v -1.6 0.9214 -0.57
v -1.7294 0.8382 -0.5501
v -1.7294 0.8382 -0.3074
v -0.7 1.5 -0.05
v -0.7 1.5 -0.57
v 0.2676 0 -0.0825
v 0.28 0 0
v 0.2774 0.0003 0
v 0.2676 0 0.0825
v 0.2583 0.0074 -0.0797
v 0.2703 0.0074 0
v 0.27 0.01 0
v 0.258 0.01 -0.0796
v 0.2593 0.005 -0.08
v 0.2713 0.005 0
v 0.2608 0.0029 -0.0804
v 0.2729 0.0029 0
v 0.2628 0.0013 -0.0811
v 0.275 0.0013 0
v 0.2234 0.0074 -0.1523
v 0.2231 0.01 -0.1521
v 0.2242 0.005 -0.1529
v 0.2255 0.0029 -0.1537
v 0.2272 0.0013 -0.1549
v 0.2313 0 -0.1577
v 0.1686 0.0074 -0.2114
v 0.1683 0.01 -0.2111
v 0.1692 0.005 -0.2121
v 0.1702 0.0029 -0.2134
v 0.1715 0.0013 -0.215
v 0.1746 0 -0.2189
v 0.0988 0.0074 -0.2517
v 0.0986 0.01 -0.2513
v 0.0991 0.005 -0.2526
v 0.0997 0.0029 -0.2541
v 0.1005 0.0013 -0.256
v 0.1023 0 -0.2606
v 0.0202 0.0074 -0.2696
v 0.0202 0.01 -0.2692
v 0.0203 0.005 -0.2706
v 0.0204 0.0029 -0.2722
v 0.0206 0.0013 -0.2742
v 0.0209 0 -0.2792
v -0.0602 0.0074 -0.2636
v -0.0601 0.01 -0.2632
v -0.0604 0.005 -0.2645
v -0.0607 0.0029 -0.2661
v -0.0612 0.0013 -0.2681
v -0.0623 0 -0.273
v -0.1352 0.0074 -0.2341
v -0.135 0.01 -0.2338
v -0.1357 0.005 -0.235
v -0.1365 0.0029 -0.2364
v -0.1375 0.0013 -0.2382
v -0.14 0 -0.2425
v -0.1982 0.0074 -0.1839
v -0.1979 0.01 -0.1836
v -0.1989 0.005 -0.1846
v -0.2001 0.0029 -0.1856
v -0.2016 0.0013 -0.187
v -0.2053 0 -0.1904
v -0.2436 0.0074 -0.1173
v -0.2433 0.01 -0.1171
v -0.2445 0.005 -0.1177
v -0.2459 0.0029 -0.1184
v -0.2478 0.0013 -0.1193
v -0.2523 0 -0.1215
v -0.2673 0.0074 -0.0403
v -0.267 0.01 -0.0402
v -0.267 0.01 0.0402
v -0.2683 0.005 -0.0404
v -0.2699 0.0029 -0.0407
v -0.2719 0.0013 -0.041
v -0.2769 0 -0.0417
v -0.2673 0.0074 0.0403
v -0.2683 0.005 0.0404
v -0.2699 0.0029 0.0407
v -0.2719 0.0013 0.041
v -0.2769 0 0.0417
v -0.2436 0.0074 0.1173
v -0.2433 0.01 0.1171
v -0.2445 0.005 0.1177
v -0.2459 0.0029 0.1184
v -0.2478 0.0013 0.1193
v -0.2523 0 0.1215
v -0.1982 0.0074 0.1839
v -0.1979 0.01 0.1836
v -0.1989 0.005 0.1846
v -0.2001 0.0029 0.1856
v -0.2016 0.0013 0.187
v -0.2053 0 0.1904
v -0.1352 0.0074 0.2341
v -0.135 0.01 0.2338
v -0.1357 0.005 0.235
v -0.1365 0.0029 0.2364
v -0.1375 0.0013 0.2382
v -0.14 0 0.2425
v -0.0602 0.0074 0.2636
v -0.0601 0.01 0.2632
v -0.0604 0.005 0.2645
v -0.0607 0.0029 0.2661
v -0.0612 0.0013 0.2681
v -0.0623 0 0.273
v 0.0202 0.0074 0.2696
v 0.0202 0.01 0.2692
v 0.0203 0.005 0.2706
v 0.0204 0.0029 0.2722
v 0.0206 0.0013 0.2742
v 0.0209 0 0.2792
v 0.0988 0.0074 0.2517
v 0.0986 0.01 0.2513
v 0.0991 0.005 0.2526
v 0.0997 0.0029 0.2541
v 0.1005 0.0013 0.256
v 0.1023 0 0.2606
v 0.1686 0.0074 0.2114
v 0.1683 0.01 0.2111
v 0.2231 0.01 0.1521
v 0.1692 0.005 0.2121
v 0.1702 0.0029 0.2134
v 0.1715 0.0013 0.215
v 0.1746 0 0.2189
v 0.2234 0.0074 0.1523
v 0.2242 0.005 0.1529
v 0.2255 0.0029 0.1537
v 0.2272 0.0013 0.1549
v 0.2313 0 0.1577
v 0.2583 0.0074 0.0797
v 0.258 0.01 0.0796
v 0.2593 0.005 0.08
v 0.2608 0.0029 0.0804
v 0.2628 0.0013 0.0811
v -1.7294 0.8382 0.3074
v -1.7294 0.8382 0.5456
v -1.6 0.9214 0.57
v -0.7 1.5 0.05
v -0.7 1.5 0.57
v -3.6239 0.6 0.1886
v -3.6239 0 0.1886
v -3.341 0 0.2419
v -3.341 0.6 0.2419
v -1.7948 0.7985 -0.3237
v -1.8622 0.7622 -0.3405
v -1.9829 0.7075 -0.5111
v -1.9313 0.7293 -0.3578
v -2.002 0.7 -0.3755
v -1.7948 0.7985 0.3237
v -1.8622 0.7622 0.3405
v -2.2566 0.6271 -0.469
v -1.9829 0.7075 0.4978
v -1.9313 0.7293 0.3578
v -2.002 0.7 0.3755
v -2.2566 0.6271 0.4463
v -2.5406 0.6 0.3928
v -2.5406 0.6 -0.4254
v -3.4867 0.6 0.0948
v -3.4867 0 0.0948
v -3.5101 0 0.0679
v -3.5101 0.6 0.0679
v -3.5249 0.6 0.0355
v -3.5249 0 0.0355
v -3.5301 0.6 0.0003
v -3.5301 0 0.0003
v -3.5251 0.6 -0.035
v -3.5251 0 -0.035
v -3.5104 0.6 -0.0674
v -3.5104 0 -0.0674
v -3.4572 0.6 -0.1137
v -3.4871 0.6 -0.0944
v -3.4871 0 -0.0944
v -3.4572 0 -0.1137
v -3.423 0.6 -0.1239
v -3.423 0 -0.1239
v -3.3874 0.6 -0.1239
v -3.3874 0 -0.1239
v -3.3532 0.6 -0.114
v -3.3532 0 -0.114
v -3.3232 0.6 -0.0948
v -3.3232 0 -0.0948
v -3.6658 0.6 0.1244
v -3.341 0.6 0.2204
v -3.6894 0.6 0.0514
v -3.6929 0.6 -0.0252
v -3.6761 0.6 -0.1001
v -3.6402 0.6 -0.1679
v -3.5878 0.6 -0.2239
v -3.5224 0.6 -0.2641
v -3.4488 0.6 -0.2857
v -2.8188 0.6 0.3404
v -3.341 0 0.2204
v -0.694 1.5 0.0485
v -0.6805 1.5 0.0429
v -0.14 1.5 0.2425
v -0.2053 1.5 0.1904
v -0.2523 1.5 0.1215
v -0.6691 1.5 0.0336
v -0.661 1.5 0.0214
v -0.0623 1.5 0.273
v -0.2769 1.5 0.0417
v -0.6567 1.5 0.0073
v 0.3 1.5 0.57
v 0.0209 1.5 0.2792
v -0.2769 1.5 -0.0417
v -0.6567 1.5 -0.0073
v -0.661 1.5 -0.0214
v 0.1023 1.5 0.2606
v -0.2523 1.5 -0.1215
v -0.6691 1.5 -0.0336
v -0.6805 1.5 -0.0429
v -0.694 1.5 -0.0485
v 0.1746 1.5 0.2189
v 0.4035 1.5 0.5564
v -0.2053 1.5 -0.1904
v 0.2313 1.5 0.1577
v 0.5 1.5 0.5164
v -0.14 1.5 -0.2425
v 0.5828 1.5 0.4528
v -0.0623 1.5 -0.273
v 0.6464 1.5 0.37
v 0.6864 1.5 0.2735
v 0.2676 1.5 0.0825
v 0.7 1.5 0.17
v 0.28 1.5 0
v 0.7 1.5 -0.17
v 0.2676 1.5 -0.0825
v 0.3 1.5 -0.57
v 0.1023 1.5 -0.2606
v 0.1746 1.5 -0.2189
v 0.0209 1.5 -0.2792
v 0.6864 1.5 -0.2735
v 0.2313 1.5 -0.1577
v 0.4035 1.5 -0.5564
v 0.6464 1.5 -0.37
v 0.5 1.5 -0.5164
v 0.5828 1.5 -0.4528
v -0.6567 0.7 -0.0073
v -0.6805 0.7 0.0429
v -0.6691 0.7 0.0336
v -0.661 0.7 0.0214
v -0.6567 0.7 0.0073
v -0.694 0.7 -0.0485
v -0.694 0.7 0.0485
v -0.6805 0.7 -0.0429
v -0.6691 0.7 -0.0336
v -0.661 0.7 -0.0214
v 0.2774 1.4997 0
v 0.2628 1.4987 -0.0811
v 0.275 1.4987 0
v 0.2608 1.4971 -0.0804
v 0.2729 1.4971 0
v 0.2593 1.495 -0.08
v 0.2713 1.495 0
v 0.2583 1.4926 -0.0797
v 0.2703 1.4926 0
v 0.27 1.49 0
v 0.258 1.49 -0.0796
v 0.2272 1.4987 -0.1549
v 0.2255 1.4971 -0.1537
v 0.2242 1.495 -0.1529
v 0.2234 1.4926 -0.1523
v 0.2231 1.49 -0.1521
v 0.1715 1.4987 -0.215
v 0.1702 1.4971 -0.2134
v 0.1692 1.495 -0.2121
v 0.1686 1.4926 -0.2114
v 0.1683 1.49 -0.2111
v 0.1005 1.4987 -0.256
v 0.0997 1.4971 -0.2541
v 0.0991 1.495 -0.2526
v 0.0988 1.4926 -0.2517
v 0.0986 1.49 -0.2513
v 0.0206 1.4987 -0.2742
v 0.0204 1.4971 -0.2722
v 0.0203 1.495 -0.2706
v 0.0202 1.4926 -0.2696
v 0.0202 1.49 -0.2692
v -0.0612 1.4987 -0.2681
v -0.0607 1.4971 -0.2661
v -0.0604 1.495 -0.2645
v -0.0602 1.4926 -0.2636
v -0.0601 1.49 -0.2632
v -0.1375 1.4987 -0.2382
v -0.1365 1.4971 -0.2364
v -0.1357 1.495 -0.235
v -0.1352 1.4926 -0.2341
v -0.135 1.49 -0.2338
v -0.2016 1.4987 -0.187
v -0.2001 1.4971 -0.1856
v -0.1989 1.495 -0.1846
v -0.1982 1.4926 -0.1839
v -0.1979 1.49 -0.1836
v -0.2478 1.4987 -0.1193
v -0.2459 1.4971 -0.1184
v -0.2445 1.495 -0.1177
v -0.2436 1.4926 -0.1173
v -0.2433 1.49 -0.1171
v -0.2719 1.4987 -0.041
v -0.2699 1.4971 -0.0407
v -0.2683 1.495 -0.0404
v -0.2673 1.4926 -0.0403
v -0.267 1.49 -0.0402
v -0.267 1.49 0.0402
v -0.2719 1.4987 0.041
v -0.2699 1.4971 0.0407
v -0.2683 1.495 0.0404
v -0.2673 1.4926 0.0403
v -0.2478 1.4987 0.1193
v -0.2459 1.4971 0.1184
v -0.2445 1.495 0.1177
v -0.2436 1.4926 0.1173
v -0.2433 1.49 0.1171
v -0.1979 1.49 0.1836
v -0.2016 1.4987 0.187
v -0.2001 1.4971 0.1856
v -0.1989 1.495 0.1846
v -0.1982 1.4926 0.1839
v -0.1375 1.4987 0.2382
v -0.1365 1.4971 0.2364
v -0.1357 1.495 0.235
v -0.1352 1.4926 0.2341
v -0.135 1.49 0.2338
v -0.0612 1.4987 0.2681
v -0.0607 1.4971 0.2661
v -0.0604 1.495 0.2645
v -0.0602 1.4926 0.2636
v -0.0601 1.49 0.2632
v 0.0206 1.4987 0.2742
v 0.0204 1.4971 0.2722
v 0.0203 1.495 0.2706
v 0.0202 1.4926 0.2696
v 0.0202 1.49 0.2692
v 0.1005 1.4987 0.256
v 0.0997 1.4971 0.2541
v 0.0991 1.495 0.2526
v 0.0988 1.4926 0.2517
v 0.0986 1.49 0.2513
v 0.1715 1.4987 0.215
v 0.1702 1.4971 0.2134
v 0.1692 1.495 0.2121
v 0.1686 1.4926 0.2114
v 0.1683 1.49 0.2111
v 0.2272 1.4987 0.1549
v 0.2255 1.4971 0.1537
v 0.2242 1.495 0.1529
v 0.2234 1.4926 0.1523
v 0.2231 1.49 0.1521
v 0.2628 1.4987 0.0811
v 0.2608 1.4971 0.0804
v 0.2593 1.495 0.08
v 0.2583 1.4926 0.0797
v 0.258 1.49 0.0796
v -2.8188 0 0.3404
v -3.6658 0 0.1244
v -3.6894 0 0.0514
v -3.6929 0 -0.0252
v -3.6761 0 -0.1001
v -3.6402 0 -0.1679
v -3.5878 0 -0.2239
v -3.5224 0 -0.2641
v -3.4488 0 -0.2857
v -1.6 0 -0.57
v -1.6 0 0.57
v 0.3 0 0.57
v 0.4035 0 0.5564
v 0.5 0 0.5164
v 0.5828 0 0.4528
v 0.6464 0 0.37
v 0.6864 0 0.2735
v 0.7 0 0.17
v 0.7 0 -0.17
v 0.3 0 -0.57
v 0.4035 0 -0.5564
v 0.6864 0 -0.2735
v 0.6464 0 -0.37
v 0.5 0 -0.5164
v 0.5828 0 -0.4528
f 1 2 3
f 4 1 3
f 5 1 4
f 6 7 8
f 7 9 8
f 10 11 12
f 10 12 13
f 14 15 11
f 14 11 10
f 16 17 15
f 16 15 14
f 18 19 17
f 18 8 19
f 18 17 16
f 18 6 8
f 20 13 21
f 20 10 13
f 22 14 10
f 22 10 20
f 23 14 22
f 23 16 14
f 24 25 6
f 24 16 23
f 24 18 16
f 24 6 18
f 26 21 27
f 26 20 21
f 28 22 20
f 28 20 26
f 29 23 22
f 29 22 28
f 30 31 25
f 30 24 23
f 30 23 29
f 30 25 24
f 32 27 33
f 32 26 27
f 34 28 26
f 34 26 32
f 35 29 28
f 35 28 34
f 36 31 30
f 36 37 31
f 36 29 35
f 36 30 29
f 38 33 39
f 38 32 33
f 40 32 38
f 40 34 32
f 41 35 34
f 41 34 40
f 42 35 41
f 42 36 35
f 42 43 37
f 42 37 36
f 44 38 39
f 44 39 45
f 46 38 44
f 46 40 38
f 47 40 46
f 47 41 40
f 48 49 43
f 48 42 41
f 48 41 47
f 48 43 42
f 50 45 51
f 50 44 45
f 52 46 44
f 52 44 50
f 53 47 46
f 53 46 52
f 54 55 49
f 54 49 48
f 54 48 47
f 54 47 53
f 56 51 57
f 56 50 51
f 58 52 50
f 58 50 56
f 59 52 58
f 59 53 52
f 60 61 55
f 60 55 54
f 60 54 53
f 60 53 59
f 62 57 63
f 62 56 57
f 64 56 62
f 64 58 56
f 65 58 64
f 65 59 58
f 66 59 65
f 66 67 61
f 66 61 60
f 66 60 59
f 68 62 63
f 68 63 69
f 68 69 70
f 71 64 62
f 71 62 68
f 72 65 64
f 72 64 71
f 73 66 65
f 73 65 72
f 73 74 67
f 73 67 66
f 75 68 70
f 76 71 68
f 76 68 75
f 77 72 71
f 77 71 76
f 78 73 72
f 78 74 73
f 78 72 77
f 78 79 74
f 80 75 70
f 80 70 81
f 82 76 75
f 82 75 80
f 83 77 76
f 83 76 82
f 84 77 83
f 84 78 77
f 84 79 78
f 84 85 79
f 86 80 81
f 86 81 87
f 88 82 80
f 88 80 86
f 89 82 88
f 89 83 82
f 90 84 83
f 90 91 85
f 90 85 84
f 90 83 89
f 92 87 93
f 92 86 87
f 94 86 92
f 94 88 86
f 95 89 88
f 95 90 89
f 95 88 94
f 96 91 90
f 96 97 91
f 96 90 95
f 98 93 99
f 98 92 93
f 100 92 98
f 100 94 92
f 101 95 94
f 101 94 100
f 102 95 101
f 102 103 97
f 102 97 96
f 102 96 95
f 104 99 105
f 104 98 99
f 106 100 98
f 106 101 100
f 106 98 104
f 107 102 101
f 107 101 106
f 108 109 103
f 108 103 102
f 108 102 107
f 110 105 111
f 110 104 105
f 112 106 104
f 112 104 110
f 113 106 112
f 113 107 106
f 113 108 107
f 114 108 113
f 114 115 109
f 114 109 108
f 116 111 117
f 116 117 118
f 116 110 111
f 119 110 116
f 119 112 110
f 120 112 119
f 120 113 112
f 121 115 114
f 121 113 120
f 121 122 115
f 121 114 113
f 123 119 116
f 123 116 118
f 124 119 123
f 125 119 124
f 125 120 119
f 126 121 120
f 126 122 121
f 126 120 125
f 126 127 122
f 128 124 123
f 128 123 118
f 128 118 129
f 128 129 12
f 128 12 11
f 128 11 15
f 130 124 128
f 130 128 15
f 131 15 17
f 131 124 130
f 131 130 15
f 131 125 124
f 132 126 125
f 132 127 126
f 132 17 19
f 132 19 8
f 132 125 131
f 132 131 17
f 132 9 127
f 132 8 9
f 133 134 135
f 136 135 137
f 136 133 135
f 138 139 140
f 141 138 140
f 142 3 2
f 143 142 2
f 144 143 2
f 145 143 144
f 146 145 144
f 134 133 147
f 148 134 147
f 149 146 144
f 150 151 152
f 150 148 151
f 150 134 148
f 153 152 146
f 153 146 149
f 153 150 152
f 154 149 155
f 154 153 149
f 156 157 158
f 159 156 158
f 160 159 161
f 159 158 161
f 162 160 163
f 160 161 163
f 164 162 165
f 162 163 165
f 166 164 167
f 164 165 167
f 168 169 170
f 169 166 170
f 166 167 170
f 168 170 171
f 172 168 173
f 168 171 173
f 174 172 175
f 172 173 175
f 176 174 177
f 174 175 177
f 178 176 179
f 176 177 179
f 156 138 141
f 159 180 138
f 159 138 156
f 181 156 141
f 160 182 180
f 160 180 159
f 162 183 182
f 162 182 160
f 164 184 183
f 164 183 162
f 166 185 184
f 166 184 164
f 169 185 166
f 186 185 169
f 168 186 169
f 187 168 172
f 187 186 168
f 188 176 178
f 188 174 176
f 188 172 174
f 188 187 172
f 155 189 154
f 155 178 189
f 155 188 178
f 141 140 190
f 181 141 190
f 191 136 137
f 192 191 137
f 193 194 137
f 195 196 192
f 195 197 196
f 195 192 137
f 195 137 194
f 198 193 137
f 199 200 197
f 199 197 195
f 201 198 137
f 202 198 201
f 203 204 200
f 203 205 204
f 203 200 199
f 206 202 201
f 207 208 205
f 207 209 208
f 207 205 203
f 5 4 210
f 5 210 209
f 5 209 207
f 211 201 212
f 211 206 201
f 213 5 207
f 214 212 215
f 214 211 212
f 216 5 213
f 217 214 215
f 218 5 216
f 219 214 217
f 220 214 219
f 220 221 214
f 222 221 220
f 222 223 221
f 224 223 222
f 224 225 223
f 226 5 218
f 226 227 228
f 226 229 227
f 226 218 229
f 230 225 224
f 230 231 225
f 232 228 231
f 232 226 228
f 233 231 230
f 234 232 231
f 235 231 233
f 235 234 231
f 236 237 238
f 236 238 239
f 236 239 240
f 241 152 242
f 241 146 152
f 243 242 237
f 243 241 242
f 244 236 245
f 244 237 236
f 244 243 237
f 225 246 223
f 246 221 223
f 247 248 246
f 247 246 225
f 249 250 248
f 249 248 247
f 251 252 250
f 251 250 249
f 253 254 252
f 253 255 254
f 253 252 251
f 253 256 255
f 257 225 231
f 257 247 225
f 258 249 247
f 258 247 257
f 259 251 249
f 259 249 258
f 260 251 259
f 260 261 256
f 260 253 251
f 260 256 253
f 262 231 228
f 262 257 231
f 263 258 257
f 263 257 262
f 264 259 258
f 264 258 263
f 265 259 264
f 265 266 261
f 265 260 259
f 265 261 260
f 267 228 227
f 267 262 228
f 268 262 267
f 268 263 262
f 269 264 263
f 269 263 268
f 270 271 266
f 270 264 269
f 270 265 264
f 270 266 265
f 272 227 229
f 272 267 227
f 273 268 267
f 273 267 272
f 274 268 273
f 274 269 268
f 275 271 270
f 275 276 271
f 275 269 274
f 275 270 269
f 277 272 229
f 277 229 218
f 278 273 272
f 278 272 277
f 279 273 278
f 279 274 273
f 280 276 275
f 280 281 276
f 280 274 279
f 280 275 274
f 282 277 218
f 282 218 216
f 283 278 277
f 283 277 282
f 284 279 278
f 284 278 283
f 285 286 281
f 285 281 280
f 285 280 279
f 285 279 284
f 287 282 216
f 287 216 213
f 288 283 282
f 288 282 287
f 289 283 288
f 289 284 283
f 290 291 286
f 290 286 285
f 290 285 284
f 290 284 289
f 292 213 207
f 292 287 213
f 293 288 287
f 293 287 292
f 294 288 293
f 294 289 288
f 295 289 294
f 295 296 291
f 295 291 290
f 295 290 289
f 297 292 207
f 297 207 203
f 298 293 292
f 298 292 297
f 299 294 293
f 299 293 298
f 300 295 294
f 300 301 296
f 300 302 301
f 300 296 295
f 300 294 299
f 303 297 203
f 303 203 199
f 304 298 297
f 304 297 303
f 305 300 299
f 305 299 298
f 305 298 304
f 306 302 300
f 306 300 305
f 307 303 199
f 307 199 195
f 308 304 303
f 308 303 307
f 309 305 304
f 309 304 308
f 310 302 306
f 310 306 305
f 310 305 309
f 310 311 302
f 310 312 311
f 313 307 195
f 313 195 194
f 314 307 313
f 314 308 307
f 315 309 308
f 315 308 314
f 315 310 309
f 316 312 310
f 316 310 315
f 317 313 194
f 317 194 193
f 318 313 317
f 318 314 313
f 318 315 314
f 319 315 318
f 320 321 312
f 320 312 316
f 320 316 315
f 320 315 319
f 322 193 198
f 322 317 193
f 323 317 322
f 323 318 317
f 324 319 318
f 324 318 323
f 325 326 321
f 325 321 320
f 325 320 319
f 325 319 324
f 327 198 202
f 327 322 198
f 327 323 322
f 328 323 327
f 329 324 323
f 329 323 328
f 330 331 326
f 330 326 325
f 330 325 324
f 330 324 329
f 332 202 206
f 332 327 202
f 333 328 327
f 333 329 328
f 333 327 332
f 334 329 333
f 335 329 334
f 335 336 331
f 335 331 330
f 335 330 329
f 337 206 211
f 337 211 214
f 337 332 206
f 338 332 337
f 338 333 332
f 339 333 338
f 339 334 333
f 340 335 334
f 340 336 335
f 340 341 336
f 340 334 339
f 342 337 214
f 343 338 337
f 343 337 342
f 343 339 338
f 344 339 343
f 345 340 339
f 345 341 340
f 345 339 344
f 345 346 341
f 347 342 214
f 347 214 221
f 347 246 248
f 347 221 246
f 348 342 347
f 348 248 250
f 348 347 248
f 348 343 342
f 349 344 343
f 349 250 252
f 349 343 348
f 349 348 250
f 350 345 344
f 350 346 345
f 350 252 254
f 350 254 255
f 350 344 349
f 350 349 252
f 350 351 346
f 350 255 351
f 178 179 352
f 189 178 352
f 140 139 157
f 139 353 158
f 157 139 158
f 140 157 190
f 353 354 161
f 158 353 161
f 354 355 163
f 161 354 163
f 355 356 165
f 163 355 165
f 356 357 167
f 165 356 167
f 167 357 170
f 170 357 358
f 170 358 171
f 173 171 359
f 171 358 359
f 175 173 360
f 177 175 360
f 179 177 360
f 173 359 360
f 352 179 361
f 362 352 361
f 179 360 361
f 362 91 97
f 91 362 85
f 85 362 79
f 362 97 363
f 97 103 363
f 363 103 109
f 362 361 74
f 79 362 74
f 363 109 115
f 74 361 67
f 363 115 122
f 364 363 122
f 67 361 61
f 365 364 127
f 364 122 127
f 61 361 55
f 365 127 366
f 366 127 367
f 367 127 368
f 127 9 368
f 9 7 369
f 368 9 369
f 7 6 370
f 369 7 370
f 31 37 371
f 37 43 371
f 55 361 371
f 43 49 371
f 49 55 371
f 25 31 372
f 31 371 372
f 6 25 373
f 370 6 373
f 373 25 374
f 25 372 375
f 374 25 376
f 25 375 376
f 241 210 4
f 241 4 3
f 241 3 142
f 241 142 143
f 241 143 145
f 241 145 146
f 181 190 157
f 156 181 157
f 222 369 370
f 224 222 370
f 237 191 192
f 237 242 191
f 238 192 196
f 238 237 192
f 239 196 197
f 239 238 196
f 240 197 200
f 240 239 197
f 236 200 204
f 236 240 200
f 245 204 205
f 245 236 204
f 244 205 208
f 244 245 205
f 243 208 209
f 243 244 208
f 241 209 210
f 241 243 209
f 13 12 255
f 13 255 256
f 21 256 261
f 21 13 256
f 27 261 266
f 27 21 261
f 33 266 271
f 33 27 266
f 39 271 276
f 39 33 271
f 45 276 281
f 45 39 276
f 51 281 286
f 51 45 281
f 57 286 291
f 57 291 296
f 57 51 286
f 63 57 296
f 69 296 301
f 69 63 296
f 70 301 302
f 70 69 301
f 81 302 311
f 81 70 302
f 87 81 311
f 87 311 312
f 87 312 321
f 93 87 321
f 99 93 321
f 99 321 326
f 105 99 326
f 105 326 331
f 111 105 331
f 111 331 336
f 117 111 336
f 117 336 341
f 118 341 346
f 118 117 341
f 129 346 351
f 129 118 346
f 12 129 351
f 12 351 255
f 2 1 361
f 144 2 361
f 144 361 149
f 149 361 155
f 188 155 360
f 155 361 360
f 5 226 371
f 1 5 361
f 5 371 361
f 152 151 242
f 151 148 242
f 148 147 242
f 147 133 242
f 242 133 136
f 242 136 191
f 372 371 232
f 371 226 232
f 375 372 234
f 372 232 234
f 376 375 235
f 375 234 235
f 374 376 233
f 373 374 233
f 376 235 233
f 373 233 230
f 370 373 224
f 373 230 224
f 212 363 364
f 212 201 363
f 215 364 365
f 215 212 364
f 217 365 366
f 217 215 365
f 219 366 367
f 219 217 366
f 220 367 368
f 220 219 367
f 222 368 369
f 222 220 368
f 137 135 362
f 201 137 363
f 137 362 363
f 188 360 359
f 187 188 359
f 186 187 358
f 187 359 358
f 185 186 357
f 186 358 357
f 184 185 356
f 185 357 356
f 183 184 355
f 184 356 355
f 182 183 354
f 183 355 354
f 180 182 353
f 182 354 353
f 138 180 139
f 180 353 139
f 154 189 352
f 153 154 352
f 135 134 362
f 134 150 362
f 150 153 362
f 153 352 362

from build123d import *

# Parameters (mm, degrees)
SKETCH1_R               = 0.27
BOSS_EXTRUDE1_DEPTH     = 1.5
CUT_EXTRUDE1_DEPTH      = 1.57
CUT_EXTRUDE1_DEPTH_BACK = 1.57
FILLET1_R               = 0.01
FILLET2_R               = 1.5
FILLET3_R               = 0.4
CUT_EXTRUDE2_DEPTH      = 0.8
FILLET4_R               = 0.05


with BuildPart() as part:
    # Sketch1 → Boss-Extrude1 (new body)
    with BuildSketch(Plane(origin=(0, 0, 0), x_dir=(1, 0, 0), z_dir=(0, 1, 0))):
        with BuildLine():
            Line((0.7, -0.57), (0.7, 0.57))
            Line((0.7, 0.57), (-1.6, 0.57))
            Line((-1.6, 0.57), (-3.448849779, 0.285704322))
            ThreePointArc((-3.448849779, 0.285704322), (-3.676095639, 0.10009665), (-3.623939692, -0.188643104))
            Line((-3.623939692, -0.188643104), (-3.34104042, -0.241947849))
            Line((-3.34104042, -0.241947849), (-3.34104042, -0.220416717))
            Line((-3.34104042, -0.220416717), (-3.486679159, -0.094774919))
            ThreePointArc((-3.486679159, -0.094774919), (-3.499692238, 0.08176184), (-3.323155479, 0.094774919))
            Line((-3.323155479, 0.094774919), (-2.818770339, -0.340355572))
            Line((-2.818770339, -0.340355572), (-1.6, -0.57))
            Line((-1.6, -0.57), (0.7, -0.57))
        make_face()
        Circle(SKETCH1_R, mode=Mode.SUBTRACT)
    extrude(amount=BOSS_EXTRUDE1_DEPTH)

    # Sketch2 → Cut-Extrude1 (cut, two sides)
    with BuildSketch(Plane.XY) as cut_extrude1_sk:
        Polygon((-4.254461252, 0.6), (-2.1, 0.6), (-0.7, 1.5), (-4.254461252, 1.5), align=None)
    extrude(amount=CUT_EXTRUDE1_DEPTH, mode=Mode.SUBTRACT)
    extrude(cut_extrude1_sk.sketch, amount=-CUT_EXTRUDE1_DEPTH_BACK, mode=Mode.SUBTRACT)

    # Fillet1
    fillet1_edges = [part.edges().sort_by_distance(p)[0] for p in [
        (-0.27, 0, 0),
        (-0.27, 1.5, 0),
    ]]
    fillet(fillet1_edges, radius=FILLET1_R)

    # Fillet2
    fillet2_edges = [part.edges().sort_by_distance(p)[0] for p in [
        (-2.1, 0.6, -0.008663527),
    ]]
    fillet(fillet2_edges, radius=FILLET2_R)

    # Fillet3
    fillet3_edges = [part.edges().sort_by_distance(p)[0] for p in [
        (0.7, 0.75, -0.57),
        (0.7, 0.75, 0.57),
    ]]
    fillet(fillet3_edges, radius=FILLET3_R)

    # Sketch4 → Cut-Extrude2 (cut)
    with BuildSketch(Plane(origin=(0, 1.5, 0), x_dir=(1, 0, 0), z_dir=(0, 1, 0))):
        Polygon((-0.5, 0), (-2.5, 0.5), (-2.5, -0.5), align=None)
    extrude(amount=-CUT_EXTRUDE2_DEPTH, mode=Mode.SUBTRACT)

    # Fillet4
    fillet4_edges = [part.edges().sort_by_distance(p)[0] for p in [
        (-0.5, 1.1, 0),
    ]]
    fillet(fillet4_edges, radius=FILLET4_R)


solid = part.part
